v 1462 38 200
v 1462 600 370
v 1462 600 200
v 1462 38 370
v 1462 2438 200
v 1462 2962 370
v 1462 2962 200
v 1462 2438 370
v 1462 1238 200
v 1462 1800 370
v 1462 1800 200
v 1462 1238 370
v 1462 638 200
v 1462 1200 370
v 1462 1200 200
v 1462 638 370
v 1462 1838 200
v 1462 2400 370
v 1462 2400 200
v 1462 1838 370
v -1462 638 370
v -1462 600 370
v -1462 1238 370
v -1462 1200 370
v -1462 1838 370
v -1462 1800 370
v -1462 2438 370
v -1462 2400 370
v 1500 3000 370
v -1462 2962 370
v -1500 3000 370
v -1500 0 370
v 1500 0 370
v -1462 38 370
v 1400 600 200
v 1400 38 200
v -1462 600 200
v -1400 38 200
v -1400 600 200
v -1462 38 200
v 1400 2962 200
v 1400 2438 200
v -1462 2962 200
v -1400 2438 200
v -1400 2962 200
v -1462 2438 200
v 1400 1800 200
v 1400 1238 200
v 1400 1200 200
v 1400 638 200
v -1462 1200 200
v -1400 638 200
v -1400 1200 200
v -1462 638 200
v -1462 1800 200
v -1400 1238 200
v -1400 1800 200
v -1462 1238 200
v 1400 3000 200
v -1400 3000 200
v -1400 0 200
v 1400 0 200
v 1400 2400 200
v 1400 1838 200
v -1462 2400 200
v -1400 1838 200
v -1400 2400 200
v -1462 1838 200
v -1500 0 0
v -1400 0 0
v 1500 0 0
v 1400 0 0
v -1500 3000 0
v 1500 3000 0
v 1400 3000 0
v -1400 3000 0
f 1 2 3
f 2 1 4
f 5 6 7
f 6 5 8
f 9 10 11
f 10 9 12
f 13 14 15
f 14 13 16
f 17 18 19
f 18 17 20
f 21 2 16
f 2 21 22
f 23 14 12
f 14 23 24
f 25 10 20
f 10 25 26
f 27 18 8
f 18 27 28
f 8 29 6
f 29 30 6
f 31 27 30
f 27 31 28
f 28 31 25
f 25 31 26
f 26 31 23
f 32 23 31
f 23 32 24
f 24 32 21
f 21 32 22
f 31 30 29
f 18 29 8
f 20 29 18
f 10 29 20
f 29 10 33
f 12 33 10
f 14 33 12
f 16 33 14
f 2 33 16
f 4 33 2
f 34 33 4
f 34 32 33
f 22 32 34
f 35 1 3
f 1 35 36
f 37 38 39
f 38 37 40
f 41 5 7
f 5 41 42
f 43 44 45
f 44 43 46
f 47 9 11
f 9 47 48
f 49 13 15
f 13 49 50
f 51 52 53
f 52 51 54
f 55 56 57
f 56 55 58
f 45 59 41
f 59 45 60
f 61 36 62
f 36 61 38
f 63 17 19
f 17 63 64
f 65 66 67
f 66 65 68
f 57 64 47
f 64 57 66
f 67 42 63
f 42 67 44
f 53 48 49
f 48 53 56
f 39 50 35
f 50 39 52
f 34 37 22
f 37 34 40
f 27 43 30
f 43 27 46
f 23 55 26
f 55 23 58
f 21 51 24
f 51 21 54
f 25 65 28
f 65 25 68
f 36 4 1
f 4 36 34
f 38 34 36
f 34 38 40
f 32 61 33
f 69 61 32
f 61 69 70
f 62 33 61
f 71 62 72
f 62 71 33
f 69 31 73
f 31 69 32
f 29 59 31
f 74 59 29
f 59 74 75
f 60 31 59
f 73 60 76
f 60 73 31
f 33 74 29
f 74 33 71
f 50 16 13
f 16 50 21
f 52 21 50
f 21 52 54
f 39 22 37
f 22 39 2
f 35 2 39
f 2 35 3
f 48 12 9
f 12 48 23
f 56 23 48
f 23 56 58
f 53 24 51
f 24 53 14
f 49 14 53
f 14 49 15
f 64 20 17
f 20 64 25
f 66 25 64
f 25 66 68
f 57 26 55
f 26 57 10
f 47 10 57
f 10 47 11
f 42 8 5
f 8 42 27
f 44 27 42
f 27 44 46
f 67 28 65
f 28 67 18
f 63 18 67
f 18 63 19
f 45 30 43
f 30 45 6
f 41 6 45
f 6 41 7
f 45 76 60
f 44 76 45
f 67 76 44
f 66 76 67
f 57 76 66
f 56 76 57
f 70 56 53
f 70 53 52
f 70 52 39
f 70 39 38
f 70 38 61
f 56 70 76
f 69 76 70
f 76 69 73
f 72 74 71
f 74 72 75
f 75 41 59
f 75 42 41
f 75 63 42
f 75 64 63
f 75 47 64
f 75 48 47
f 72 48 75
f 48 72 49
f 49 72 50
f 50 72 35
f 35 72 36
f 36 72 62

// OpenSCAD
// Archiyou -> OpenSCAD  |  script: timberfloor  |  units: mm
// OpenSCAD has no units: coordinates are in mm.
// Parts: 10 CSG, 0 baked, 0 2D
// Parameters at export, for reference only (nothing in this file is linked to them):
//   WIDTH = 300
//   DEPTH = 300
//   BEAM_CTC = 60
//   BEAM_AUTO = true
//   BEAM_WIDTH = 38
//   BEAM_HEIGHT = 140
//   JOIST_HEADER = true
//   HIDE_BOARDS = true

$fn = 32;
PART = "";

// beam11  (layer model)
module beam11() {
    color([1, 0, 0]) translate([0, 19, 285]) cube([2924, 38, 170], center = true);
}

// joistHeaderLeft  (layer model)
module joistHeaderLeft() {
    color([0, 0, 1]) translate([-1481, 1500, 285]) cube([38, 3000, 170], center = true);
}

// joistHeaderRight  (layer model)
module joistHeaderRight() {
    color([0, 0, 1]) translate([1481, 1500, 285]) cube([38, 3000, 170], center = true);
}

// beam12  (layer model)
module beam12() {
    color([1, 0, 0]) translate([0, 619, 285]) cube([2924, 38, 170], center = true);
}

// beam13  (layer model)
module beam13() {
    color([1, 0, 0]) translate([0, 1219, 285]) cube([2924, 38, 170], center = true);
}

// beam14  (layer model)
module beam14() {
    color([1, 0, 0]) translate([0, 1819, 285]) cube([2924, 38, 170], center = true);
}

// beam15  (layer model)
module beam15() {
    color([1, 0, 0]) translate([0, 2419, 285]) cube([2924, 38, 170], center = true);
}

// lastBeam  (layer model)
module lastBeam() {
    color([1, 0, 0]) translate([0, 2981, 285]) cube([2924, 38, 170], center = true);
}

// supportLeft  (layer model)
module supportLeft() {
    color([0.502, 0.502, 0.502]) translate([-1450, 1500, 100]) cube([100, 3000, 200], center = true);
}

// supportRight  (layer model)
module supportRight() {
    color([0.502, 0.502, 0.502]) translate([1450, 1500, 100]) cube([100, 3000, 200], center = true);
}

// 3D parts
if (PART == "" || PART == "beam11") beam11();
if (PART == "" || PART == "joistHeaderLeft") joistHeaderLeft();
if (PART == "" || PART == "joistHeaderRight") joistHeaderRight();
if (PART == "" || PART == "beam12") beam12();
if (PART == "" || PART == "beam13") beam13();
if (PART == "" || PART == "beam14") beam14();
if (PART == "" || PART == "beam15") beam15();
if (PART == "" || PART == "lastBeam") lastBeam();
if (PART == "" || PART == "supportLeft") supportLeft();
if (PART == "" || PART == "supportRight") supportRight();
